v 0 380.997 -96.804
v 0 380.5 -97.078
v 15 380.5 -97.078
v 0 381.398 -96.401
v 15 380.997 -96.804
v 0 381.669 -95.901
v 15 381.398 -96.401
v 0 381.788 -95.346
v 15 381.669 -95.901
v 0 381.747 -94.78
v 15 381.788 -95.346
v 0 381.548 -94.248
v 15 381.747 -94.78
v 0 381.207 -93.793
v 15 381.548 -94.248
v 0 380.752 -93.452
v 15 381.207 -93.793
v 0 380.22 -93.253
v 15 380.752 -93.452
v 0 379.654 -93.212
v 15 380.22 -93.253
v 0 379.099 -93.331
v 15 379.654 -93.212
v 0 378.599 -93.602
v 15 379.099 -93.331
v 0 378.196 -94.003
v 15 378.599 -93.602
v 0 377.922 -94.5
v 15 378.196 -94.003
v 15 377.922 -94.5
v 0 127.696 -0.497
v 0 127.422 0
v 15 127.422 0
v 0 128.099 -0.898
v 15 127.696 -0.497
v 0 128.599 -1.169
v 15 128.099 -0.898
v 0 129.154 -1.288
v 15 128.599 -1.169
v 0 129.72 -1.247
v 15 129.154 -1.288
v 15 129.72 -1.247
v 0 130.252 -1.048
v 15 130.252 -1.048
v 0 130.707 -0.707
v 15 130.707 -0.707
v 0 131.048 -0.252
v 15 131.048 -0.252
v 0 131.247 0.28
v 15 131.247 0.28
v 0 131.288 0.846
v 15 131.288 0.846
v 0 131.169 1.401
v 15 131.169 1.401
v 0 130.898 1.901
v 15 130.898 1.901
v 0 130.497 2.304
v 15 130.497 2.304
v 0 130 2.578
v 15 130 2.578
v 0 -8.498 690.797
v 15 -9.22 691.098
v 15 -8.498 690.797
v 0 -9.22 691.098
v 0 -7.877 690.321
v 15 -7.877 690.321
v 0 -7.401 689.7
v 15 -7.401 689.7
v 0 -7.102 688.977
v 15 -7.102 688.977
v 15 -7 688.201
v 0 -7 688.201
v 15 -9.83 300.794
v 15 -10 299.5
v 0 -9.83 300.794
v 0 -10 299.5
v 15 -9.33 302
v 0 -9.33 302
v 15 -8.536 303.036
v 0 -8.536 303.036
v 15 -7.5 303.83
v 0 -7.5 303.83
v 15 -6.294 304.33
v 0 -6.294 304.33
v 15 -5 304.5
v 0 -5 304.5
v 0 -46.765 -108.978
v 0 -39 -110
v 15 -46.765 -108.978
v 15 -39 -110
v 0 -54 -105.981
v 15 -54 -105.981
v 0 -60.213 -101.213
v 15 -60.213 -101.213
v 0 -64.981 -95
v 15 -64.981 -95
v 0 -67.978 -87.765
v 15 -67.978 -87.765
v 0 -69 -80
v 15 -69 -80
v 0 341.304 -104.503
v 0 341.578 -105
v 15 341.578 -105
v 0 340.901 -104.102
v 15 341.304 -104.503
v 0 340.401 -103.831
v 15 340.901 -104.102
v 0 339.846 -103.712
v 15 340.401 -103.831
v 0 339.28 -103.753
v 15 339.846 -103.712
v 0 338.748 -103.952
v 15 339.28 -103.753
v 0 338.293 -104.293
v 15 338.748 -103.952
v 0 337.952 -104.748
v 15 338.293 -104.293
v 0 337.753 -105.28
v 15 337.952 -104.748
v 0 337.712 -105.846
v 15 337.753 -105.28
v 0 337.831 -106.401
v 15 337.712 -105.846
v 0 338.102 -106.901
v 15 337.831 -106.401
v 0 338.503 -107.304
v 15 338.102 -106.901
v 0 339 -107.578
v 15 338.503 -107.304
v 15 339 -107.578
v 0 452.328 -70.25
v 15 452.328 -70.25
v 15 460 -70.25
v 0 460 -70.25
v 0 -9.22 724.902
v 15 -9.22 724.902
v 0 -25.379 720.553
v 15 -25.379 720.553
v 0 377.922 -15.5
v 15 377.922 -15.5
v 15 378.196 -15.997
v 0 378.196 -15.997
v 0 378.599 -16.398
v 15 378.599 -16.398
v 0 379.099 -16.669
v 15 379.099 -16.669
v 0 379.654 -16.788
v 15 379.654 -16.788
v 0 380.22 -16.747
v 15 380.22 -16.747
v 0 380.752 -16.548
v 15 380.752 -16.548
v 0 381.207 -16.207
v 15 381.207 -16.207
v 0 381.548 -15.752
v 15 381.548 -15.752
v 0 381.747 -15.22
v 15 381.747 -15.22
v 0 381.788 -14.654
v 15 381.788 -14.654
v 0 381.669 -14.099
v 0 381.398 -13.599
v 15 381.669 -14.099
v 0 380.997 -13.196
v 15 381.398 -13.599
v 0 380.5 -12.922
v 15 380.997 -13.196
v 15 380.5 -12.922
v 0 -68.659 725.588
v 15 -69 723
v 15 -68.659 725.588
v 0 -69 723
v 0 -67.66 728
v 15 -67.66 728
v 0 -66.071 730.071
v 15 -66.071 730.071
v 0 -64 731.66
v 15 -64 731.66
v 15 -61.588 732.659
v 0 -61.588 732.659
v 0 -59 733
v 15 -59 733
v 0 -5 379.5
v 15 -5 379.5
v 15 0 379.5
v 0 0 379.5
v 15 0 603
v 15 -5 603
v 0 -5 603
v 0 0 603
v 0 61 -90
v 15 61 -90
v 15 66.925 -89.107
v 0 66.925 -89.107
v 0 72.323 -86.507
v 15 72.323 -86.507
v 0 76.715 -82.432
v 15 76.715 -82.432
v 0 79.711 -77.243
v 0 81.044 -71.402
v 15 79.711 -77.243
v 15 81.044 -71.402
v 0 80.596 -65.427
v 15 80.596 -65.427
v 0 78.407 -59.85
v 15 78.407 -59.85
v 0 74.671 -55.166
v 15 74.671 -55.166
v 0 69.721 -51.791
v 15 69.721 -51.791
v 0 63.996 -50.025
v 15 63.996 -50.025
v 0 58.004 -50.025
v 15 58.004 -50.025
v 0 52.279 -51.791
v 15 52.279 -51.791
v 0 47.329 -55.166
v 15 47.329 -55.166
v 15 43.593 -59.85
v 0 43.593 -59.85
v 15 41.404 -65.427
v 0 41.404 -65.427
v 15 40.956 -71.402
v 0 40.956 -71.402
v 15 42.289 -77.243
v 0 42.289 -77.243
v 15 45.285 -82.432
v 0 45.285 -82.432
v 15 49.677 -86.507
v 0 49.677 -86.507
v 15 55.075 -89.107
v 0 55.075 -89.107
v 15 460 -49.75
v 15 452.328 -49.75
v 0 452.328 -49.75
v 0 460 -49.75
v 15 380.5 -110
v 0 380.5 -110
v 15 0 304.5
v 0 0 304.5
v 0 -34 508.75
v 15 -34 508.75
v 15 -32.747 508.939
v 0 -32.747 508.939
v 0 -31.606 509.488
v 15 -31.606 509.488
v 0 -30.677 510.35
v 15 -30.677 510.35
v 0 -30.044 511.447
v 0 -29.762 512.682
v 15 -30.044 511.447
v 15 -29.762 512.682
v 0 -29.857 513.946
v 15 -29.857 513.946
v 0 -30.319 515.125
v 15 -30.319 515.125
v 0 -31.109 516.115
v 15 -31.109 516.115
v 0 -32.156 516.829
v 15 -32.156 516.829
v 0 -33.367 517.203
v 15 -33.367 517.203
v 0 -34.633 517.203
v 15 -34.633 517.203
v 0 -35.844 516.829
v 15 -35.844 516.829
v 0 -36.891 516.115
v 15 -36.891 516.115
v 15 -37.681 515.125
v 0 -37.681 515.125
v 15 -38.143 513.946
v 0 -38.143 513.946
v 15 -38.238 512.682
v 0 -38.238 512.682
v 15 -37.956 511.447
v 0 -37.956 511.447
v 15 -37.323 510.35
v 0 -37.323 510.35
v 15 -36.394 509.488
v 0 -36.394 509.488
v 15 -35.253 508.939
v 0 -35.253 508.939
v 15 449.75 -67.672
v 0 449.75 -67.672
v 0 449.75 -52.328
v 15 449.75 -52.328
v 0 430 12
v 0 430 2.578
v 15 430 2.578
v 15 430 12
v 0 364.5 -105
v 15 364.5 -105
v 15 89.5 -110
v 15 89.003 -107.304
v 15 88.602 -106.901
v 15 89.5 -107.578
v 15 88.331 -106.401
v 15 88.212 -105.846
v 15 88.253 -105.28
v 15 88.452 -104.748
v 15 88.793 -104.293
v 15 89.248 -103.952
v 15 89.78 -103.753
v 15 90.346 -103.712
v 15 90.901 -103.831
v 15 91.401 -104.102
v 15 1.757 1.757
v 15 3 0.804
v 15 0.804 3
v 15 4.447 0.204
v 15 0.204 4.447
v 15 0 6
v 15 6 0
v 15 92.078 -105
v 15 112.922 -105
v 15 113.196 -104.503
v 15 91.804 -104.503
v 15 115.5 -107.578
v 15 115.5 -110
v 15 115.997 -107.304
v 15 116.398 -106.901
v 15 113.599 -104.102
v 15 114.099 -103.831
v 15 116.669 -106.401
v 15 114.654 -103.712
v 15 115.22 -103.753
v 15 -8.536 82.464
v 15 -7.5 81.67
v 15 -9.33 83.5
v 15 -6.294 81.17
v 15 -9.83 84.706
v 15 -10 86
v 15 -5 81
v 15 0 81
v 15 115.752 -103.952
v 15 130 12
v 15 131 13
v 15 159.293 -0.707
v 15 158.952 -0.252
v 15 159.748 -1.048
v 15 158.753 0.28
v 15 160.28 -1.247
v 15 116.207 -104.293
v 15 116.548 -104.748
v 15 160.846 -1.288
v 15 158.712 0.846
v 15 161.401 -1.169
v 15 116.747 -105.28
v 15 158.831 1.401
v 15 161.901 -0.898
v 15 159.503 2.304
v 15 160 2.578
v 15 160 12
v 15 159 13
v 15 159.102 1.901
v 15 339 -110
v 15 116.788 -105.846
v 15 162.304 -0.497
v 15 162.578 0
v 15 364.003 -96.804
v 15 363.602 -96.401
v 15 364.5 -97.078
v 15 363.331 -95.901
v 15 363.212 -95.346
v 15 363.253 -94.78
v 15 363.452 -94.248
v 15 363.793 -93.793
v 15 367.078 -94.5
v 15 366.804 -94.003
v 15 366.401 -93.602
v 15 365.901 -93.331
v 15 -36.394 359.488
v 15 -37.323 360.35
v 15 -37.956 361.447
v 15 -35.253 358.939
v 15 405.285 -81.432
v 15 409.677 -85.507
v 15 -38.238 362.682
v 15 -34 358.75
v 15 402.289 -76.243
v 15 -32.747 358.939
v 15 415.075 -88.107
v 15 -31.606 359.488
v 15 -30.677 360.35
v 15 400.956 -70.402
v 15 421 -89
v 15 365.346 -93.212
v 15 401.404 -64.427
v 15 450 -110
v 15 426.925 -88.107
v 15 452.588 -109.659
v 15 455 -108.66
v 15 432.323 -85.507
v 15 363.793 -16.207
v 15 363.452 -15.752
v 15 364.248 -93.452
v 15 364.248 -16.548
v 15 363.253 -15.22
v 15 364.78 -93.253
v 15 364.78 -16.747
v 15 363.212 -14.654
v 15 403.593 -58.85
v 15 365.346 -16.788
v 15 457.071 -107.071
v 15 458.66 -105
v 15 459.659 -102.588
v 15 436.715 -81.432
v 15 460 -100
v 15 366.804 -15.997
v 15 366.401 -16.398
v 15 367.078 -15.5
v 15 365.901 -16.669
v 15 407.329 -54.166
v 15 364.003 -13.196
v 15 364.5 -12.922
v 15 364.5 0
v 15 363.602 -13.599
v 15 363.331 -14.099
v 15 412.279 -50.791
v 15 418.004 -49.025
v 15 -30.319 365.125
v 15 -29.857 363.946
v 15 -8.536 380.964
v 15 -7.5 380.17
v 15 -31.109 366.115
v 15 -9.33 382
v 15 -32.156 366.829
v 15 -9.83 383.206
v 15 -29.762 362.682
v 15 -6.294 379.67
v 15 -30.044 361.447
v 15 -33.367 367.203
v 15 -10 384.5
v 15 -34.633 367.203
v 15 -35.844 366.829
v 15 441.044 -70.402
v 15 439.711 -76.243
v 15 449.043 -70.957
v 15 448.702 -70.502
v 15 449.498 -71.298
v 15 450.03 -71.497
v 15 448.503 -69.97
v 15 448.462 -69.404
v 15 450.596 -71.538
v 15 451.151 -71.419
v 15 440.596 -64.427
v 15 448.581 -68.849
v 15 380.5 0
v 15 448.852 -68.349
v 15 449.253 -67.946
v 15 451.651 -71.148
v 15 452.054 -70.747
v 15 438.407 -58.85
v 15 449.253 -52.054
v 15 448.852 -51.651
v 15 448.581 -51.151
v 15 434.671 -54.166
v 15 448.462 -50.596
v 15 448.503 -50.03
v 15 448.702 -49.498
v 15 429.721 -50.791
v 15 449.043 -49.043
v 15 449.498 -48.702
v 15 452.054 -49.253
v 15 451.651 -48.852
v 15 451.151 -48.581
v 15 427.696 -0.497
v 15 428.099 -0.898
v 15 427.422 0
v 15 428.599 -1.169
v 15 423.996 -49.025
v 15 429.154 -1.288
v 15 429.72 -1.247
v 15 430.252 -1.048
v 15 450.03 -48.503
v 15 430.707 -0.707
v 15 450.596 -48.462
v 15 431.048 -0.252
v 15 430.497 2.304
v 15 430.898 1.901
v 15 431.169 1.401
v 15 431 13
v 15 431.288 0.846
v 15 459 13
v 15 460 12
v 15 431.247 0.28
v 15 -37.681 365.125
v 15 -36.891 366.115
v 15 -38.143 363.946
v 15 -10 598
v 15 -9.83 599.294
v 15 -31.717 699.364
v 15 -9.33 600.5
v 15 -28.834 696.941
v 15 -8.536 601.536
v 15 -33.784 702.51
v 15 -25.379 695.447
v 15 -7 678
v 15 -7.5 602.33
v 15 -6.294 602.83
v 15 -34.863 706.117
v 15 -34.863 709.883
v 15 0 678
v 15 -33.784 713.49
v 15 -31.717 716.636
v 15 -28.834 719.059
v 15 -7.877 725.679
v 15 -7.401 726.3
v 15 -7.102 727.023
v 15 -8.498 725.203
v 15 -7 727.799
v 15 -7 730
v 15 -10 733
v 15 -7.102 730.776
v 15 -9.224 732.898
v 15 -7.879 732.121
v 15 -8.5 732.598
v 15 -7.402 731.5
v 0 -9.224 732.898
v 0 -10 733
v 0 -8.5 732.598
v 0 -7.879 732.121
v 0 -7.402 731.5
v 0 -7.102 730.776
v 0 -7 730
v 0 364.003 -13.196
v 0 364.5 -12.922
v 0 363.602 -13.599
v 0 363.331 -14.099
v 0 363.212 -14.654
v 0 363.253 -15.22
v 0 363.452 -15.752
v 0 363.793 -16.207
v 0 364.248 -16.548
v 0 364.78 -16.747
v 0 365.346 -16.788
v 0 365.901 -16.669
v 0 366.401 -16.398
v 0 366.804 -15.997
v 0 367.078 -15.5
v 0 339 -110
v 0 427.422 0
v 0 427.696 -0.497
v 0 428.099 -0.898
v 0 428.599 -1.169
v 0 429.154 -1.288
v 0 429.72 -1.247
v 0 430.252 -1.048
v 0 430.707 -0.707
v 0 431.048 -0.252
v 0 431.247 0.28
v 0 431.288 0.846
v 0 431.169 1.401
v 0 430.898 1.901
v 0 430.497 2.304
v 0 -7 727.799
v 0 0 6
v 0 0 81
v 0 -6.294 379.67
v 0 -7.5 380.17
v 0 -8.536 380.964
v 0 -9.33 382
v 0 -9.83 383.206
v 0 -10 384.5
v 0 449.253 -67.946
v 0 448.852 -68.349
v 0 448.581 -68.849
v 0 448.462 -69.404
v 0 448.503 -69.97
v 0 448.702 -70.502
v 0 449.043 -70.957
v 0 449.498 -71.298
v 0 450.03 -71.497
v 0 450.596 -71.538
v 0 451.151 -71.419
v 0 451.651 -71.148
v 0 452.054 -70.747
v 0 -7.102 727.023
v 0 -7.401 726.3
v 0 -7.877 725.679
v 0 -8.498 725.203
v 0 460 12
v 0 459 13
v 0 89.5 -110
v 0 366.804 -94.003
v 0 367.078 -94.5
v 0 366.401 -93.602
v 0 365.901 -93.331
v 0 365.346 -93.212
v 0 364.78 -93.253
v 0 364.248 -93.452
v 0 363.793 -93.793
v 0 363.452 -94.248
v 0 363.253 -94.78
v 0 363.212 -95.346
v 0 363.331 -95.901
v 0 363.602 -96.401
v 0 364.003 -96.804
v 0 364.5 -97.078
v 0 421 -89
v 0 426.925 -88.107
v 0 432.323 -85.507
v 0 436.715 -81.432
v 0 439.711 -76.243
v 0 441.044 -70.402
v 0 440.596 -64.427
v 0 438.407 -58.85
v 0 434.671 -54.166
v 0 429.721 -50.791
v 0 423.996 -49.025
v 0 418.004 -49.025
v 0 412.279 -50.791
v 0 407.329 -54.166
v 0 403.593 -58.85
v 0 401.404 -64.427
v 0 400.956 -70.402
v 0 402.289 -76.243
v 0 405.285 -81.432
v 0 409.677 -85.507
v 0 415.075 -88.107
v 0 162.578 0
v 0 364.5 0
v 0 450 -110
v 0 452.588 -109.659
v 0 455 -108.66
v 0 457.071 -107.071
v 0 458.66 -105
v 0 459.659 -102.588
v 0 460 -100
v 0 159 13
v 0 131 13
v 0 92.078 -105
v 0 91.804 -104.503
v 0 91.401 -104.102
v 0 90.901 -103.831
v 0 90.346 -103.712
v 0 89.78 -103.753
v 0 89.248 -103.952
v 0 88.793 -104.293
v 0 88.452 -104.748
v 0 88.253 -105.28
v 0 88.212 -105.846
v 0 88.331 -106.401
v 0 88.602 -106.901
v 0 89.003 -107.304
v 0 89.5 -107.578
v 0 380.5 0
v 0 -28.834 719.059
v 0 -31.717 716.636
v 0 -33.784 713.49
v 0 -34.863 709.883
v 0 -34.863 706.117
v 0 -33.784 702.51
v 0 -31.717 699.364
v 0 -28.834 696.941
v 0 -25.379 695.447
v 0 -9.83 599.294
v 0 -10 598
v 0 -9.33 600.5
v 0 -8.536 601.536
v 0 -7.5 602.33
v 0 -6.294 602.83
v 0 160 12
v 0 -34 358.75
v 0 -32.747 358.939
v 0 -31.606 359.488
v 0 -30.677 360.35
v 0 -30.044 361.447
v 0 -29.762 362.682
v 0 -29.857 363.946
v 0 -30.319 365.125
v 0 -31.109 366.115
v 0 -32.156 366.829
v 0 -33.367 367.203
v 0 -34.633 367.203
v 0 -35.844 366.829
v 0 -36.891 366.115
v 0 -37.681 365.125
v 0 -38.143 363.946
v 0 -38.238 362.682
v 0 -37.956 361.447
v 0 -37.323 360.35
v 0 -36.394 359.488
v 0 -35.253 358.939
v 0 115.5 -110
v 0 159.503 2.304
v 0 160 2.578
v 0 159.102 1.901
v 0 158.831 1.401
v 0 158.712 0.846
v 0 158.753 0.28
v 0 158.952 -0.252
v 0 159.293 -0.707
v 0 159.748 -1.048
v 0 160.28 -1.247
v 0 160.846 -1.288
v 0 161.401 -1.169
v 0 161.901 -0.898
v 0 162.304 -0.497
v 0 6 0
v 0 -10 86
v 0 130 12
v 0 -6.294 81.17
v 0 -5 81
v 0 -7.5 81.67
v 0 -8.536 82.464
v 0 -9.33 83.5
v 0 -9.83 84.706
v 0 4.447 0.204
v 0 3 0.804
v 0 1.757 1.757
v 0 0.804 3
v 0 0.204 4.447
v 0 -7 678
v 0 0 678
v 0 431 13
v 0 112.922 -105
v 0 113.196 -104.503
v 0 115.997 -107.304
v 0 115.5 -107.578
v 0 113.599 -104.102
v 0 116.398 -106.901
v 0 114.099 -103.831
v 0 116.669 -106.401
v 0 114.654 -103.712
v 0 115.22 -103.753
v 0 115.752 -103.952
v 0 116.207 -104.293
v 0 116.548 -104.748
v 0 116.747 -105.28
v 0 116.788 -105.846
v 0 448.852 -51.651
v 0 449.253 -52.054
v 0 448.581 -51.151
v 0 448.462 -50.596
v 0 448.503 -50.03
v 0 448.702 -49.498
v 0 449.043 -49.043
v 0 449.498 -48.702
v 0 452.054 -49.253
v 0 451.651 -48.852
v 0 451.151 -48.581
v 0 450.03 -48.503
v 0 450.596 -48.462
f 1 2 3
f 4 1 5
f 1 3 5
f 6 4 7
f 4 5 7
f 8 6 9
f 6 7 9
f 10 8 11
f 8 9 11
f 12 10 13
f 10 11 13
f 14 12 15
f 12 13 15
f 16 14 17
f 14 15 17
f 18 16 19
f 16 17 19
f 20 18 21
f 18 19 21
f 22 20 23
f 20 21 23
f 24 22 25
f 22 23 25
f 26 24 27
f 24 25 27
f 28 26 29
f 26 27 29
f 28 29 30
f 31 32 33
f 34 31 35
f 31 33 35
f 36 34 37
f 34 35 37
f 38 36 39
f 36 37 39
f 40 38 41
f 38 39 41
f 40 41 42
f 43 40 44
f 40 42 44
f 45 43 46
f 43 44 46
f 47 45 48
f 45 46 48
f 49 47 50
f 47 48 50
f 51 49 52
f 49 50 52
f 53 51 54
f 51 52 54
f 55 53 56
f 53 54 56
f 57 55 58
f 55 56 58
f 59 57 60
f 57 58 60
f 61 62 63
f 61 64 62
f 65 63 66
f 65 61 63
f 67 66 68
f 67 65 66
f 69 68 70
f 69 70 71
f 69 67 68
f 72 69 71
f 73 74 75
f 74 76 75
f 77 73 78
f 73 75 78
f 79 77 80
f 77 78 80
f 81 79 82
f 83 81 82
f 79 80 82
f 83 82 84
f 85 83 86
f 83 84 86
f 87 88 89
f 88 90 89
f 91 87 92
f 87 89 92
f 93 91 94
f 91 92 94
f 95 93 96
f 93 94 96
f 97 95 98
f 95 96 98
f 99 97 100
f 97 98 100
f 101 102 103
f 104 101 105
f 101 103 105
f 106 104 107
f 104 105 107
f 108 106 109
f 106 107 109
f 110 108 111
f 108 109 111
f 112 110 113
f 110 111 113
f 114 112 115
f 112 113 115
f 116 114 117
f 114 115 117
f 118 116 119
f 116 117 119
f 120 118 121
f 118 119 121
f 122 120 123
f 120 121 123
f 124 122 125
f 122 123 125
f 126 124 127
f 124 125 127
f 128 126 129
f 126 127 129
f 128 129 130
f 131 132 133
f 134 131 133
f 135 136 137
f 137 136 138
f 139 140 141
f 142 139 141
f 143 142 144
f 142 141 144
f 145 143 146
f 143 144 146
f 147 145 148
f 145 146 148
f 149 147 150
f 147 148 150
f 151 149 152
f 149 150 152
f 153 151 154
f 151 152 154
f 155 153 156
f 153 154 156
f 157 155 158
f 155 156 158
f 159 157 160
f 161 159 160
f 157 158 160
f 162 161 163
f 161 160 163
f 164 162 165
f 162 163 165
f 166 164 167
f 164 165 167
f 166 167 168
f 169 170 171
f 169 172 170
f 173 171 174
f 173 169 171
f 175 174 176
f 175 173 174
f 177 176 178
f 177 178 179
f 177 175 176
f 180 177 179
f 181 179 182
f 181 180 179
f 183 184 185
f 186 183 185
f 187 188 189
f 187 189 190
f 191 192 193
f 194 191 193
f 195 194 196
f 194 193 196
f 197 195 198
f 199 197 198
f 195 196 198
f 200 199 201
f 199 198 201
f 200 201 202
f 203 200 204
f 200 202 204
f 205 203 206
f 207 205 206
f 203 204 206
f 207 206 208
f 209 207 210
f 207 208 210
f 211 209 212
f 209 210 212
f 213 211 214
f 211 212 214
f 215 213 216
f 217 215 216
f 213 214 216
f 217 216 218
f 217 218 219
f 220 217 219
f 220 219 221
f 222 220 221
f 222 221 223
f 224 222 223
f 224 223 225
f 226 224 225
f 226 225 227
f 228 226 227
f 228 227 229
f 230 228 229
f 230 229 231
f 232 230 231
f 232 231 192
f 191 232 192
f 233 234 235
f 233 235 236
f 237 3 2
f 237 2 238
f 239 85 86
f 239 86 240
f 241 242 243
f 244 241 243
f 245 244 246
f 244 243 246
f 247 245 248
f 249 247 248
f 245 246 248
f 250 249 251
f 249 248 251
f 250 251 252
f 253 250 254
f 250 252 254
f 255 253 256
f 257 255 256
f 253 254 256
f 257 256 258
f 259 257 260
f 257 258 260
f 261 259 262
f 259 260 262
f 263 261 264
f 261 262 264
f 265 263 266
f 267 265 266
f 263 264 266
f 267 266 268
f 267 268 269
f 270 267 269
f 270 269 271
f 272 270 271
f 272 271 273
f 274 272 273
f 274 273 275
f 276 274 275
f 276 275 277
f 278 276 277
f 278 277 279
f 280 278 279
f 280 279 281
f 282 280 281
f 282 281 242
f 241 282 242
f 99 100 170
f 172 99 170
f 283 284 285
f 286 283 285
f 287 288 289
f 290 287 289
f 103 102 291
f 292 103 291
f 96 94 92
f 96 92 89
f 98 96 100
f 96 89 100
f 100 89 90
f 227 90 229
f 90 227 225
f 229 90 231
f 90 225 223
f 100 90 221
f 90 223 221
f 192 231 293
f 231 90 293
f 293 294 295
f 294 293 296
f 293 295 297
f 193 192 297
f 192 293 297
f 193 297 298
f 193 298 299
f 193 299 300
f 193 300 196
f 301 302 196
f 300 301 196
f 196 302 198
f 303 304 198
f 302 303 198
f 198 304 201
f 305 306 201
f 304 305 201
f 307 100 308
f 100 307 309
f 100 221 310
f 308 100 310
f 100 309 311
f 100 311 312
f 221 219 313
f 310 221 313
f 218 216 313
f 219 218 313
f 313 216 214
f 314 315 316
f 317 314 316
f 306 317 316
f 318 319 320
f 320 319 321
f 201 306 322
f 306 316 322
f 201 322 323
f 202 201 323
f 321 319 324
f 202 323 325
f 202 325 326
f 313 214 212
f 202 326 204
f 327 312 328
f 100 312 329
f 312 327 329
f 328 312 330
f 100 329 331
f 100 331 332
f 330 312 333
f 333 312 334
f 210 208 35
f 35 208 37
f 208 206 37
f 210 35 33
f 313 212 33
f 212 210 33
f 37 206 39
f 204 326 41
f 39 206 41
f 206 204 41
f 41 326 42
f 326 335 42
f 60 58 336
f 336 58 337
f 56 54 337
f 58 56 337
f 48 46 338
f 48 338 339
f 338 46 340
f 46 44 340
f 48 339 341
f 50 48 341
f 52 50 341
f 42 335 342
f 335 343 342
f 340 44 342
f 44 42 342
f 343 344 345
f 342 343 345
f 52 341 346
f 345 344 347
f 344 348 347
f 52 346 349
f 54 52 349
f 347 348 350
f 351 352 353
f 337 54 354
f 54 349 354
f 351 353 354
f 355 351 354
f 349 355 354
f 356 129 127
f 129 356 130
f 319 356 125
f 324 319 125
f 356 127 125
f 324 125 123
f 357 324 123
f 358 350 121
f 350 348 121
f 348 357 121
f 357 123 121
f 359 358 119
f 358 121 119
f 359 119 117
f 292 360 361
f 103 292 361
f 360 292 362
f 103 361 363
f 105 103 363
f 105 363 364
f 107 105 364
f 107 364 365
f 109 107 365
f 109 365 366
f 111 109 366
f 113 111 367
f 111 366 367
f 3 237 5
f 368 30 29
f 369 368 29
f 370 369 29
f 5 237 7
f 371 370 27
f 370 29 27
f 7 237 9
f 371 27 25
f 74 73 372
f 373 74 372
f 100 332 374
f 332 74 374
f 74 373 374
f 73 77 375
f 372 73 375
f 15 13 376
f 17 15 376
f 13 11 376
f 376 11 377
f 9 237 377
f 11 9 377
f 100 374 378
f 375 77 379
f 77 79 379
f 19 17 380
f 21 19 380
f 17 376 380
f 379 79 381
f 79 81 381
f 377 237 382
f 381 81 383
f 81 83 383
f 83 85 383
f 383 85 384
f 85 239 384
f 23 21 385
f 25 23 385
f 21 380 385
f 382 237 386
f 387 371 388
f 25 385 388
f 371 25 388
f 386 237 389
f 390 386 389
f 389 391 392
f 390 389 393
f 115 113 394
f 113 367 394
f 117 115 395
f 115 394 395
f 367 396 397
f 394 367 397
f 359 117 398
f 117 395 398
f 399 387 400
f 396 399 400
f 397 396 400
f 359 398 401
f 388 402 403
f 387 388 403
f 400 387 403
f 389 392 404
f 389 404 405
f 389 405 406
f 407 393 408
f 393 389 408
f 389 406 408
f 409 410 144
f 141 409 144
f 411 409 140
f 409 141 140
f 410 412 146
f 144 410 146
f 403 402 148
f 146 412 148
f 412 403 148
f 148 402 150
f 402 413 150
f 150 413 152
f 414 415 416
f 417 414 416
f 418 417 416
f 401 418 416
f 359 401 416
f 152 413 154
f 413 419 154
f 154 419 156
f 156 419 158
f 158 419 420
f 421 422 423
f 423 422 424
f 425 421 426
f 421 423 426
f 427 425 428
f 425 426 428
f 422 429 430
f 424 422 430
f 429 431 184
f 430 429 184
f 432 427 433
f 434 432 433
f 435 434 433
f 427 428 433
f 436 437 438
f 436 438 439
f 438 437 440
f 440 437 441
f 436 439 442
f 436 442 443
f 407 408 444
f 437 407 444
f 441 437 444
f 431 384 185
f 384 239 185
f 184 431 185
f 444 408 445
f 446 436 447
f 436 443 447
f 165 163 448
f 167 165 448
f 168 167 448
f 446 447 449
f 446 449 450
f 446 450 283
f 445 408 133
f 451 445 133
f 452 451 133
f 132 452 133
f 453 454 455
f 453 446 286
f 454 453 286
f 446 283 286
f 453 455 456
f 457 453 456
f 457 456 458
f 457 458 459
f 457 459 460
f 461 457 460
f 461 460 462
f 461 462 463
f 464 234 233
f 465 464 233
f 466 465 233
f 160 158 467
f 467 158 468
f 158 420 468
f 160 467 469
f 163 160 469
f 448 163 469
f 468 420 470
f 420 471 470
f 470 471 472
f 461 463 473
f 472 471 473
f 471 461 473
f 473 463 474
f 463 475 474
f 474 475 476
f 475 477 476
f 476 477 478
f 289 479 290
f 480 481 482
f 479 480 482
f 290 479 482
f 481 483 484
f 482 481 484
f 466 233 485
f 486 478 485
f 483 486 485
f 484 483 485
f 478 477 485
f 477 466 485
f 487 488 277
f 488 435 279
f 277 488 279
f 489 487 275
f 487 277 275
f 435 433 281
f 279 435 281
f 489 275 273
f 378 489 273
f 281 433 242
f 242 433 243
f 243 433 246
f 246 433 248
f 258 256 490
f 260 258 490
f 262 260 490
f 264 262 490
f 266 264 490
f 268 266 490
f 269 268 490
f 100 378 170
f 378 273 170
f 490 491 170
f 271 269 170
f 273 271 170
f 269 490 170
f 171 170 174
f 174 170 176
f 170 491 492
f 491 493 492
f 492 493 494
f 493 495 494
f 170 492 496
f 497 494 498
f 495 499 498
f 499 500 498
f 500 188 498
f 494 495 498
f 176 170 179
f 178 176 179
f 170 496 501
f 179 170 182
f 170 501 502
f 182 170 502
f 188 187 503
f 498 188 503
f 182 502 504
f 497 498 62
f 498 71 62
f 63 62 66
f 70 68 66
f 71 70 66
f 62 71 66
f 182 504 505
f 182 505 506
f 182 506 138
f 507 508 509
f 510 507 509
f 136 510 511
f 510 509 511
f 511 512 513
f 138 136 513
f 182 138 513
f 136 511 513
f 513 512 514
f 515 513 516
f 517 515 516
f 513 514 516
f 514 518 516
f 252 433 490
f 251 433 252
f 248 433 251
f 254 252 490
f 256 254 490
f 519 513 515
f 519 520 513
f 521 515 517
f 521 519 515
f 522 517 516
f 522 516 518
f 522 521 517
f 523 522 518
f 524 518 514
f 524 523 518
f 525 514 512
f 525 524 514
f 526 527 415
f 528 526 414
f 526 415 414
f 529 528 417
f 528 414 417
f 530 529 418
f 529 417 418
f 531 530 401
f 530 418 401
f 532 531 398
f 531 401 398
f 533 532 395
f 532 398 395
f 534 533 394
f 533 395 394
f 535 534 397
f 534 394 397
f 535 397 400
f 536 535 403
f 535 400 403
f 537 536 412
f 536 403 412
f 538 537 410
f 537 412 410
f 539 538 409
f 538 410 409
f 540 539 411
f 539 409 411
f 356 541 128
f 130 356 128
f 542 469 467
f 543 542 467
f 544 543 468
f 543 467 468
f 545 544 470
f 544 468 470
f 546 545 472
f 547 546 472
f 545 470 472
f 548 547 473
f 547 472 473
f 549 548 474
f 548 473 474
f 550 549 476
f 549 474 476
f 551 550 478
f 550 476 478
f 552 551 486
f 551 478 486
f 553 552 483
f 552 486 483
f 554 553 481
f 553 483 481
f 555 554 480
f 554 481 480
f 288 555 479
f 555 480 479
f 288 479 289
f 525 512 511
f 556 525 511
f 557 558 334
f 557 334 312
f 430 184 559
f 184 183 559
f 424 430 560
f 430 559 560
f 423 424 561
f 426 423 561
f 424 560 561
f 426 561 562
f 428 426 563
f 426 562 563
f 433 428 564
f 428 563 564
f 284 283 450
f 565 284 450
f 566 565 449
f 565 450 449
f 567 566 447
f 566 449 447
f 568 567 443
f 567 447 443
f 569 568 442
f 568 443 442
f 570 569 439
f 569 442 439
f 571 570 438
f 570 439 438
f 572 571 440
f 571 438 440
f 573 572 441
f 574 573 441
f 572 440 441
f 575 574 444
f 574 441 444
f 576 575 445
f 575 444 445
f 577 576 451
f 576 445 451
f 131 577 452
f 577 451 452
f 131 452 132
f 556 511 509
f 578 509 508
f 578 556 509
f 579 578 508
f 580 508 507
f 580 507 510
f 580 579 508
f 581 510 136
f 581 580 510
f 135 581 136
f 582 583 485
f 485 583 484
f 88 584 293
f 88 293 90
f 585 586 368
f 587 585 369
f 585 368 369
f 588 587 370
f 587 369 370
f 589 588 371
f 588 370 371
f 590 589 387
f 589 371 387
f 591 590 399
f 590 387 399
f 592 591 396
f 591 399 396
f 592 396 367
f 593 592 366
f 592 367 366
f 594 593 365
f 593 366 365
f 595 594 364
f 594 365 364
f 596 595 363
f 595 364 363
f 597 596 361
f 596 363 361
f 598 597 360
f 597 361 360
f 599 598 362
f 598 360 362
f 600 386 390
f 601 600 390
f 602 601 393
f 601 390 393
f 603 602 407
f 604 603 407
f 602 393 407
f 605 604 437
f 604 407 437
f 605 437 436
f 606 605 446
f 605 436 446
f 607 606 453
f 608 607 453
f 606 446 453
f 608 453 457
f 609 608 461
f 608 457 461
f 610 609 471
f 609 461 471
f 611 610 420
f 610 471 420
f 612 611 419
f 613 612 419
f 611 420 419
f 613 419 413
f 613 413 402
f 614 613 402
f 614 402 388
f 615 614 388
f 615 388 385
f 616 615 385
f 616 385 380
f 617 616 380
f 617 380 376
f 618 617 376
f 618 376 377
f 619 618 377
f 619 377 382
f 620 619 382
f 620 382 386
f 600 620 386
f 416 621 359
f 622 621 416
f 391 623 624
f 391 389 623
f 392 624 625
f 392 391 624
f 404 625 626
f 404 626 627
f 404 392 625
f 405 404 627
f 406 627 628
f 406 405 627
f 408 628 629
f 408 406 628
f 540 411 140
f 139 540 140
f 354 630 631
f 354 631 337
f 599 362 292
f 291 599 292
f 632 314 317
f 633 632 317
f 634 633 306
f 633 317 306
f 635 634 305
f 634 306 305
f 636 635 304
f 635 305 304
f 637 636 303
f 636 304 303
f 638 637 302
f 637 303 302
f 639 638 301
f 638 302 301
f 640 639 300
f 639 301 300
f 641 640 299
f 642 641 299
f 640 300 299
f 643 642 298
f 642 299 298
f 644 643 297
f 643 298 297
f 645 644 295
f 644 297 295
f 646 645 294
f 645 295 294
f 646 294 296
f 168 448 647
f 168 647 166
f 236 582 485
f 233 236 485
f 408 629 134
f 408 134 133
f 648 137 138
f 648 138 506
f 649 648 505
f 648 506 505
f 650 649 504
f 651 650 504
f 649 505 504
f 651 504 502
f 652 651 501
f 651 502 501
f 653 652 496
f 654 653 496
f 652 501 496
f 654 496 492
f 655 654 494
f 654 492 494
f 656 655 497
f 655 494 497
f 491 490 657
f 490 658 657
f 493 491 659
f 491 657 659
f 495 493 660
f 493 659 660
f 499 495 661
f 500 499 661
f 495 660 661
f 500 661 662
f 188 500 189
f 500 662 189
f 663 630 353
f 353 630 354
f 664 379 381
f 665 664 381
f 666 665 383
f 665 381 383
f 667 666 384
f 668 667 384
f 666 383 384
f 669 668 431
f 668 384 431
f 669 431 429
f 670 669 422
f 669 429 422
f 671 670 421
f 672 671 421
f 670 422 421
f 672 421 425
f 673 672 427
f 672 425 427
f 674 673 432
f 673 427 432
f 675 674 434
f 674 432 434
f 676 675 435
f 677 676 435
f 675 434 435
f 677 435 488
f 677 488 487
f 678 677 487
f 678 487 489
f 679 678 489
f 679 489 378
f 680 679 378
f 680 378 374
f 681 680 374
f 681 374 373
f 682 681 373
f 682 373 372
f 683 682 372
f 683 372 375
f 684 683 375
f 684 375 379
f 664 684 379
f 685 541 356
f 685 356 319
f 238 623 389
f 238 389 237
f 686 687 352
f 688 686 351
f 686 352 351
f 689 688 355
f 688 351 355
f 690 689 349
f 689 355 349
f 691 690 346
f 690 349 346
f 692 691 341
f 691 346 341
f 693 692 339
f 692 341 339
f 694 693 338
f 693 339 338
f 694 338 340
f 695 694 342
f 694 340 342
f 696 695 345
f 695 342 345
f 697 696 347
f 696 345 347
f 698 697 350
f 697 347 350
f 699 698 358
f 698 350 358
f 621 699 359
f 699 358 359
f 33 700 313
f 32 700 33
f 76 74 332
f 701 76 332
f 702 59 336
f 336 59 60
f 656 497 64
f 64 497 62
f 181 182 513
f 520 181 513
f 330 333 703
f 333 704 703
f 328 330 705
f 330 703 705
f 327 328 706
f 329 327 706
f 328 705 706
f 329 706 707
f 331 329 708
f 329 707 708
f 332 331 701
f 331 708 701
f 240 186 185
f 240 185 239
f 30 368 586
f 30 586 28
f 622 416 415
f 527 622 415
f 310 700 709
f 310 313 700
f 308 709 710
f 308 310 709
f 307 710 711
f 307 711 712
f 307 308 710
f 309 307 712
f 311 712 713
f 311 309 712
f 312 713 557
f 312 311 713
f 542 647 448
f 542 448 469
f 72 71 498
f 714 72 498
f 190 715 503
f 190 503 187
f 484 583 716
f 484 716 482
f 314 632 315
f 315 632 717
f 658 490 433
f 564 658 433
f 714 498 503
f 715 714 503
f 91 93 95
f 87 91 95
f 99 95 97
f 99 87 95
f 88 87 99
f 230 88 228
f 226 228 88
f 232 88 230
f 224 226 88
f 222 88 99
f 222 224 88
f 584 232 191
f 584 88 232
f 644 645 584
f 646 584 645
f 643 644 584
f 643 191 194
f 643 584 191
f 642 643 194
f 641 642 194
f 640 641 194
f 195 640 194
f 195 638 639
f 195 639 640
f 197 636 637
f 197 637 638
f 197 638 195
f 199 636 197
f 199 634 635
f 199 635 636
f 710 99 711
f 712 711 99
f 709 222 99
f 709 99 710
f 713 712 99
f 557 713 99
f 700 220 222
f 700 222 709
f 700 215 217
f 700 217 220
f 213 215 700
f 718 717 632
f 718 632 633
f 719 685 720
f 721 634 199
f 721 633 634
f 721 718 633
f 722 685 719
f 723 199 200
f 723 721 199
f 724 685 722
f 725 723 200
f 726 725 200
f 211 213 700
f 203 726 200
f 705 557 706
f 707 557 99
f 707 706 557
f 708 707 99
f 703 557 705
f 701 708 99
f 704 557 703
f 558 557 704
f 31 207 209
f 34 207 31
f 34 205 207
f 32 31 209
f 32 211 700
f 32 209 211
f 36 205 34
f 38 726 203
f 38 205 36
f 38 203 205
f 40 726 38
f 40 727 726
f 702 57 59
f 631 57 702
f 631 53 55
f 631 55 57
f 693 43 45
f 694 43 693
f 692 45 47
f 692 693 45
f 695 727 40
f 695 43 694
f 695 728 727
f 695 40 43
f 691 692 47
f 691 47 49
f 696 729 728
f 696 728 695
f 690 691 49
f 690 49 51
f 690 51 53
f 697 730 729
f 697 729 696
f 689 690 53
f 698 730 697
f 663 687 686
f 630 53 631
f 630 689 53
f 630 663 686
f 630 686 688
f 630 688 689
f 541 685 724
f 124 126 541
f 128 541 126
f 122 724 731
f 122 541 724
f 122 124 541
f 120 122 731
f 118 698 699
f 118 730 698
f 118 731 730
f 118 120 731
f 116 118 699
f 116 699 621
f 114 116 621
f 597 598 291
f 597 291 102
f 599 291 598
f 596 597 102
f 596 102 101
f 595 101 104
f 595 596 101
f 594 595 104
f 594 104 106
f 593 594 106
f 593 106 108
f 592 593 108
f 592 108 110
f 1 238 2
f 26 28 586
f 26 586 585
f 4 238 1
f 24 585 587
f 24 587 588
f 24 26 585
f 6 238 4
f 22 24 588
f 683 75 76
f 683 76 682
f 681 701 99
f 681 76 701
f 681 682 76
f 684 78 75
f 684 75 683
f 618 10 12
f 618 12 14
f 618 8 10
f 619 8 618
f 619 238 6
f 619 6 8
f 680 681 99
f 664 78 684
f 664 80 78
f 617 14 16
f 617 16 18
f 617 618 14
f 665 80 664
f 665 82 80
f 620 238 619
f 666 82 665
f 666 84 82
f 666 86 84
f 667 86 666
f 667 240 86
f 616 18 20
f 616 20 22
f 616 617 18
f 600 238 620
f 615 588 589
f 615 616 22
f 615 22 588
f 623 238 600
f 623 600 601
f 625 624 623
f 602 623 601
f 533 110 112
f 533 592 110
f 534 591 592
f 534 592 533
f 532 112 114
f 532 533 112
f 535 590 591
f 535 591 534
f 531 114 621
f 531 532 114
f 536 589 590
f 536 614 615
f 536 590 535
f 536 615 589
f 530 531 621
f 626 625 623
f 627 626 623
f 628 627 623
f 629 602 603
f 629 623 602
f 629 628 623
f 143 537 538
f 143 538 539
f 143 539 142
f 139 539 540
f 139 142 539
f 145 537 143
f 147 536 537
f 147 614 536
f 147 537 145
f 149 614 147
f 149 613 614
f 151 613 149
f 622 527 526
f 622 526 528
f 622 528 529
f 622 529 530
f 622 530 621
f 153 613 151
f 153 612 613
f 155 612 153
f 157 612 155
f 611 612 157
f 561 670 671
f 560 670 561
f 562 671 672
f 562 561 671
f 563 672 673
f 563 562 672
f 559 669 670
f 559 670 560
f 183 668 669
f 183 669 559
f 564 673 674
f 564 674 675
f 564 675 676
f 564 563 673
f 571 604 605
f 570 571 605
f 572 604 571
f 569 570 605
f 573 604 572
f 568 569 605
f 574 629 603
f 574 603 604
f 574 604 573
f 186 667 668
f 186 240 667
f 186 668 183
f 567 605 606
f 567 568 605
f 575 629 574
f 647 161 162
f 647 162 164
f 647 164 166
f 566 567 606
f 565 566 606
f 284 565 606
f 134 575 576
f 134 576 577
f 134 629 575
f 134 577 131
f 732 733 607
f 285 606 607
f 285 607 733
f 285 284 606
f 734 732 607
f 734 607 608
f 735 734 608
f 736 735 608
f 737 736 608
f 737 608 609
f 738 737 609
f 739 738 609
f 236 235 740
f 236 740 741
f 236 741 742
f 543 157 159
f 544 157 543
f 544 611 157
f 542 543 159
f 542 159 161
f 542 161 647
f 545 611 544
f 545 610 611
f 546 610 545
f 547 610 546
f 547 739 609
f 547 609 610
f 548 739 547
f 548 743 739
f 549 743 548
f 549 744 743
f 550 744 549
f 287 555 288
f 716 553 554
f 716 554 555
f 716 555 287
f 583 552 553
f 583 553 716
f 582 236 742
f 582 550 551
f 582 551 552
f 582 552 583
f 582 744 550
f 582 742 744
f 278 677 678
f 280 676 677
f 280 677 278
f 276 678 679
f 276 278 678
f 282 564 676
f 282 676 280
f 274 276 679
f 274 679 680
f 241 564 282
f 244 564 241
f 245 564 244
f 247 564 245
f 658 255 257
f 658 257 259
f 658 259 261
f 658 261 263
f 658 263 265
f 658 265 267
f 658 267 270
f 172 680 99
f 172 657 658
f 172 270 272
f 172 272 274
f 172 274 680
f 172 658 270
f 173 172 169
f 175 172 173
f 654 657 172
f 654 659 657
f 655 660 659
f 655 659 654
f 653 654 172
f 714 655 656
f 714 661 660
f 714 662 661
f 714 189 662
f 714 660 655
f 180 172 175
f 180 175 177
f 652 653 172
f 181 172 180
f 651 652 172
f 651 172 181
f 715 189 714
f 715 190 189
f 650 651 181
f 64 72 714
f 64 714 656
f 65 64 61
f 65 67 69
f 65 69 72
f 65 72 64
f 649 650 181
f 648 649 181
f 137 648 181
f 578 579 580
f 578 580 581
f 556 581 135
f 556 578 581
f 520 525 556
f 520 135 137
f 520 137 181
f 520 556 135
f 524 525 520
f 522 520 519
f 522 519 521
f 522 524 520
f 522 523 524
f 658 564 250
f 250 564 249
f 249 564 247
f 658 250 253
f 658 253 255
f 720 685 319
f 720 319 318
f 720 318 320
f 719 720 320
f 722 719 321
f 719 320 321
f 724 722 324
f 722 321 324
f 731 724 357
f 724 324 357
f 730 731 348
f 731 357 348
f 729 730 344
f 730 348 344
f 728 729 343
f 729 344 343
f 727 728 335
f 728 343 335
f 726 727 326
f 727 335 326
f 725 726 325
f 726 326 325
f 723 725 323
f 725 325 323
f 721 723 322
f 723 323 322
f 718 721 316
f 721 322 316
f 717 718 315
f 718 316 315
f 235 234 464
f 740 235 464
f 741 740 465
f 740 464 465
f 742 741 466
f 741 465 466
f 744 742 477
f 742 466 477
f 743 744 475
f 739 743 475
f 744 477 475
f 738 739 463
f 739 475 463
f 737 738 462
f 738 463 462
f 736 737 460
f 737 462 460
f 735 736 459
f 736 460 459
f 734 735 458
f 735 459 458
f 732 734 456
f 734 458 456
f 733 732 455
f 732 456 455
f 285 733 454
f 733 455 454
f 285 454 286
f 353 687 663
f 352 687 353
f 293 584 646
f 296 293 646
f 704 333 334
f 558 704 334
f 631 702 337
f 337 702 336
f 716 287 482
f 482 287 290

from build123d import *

# Parameters (mm, degrees)
BOSS_EXTRUDE1_DEPTH = 15
FILLET1_R           = 30
SKETCH2_R           = 20.1
CUT_EXTRUDE1_DEPTH  = 820.456527218
FILLET2_R           = 6
SKETCH4_W           = 15
SKETCH4_H           = 30
BOSS_EXTRUDE2_DEPTH = 13
FILLET3_R           = 10
SKETCH5_W           = 20.5
SKETCH5_H           = 10.25
CUT_EXTRUDE3_DEPTH  = 820.456527218
SKETCH6_W           = 15.5
SKETCH6_H           = 16
CUT_EXTRUDE4_DEPTH  = 820.456527218
SKETCH7_W           = 5
SKETCH7_H           = 25.5
SKETCH7_H_2         = 26
CUT_EXTRUDE5_DEPTH  = 820.456527218
CHAMFER1_SIZE       = 1
SKETCH8_W           = 223.5
SKETCH8_H           = 10
CUT_EXTRUDE6_DEPTH  = 15
FILLET4_R           = 5
SKETCH9_R           = 2
CUT_EXTRUDE7_DEPTH  = 820.456527218
SKETCH10_R          = 2
CUT_EXTRUDE8_DEPTH  = 820.456527218
SKETCH11_R          = 2
CUT_EXTRUDE9_DEPTH  = 820.456527218
SKETCH12_R          = 2
CUT_EXTRUDE10_DEPTH = 820.456527218
BOSS_EXTRUDE3_DEPTH = 15
FILLET5_R           = 10
FILLET6_R           = 3
SKETCH14_R          = 4.25
CUT_EXTRUDE11_DEPTH = 866.513720284


with BuildPart() as part:
    # Sketch1 → Boss-Extrude1 (new body)
    with BuildSketch(Plane(origin=(0, 0, 0), x_dir=(0, 0, -1), z_dir=(1, 0, 0))):
        Polygon((-678, 0), (0, 0), (0, 460), (110, 460), (110, -69), (-678, -69), align=None)
    extrude(amount=BOSS_EXTRUDE1_DEPTH)

    # Fillet1
    fillet1_edges = [part.edges().sort_by_distance(p)[0] for p in [
        (7.5, -69, -110),
    ]]
    fillet(fillet1_edges, radius=FILLET1_R)

    # Sketch2 → Cut-Extrude1 (cut, through all)
    with BuildSketch(Plane(origin=(15, 0, 0), x_dir=(0, 0, -1), z_dir=(1, 0, 0))):
        with Locations((68.9, 421)):
            Circle(SKETCH2_R)
        with Locations((69.9, 61)):
            Circle(SKETCH2_R)
    extrude(amount=-CUT_EXTRUDE1_DEPTH, mode=Mode.SUBTRACT)

    # Fillet2
    fillet2_edges = [part.edges().sort_by_distance(p)[0] for p in [
        (7.5, 0, 0),
    ]]
    fillet(fillet2_edges, radius=FILLET2_R)

    # Sketch4 → Boss-Extrude2 (add)
    with BuildSketch(Plane.XY):
        with Locations((7.5, 445)):
            Rectangle(SKETCH4_W, SKETCH4_H)
        with Locations((7.5, 145)):
            Rectangle(SKETCH4_W, SKETCH4_H)
    extrude(amount=BOSS_EXTRUDE2_DEPTH)

    # Fillet3
    fillet3_edges = [part.edges().sort_by_distance(p)[0] for p in [
        (7.5, 460, -110),
    ]]
    fillet(fillet3_edges, radius=FILLET3_R)

    # Sketch5 → Cut-Extrude3 (cut, through all)
    with BuildSketch(Plane.ZY):
        with Locations((-60, 454.875)):
            Rectangle(SKETCH5_W, SKETCH5_H)
    extrude(amount=-CUT_EXTRUDE3_DEPTH, mode=Mode.SUBTRACT)

    # Sketch6 → Cut-Extrude4 (cut, through all)
    with BuildSketch(Plane(origin=(15, 0, 0), x_dir=(0, 0, -1), z_dir=(1, 0, 0))):
        with Locations((102.25, 372.5)):
            Rectangle(SKETCH6_W, SKETCH6_H)
        with Locations((7.75, 372.5)):
            Rectangle(SKETCH6_W, SKETCH6_H)
    extrude(amount=-CUT_EXTRUDE4_DEPTH, mode=Mode.SUBTRACT)

    # Sketch7 → Cut-Extrude5 (cut, through all)
    with BuildSketch(Plane.ZY):
        with Locations((-107.5, 351.75)):
            Rectangle(SKETCH7_W, SKETCH7_H)
        with Locations((-107.5, 102.5)):
            Rectangle(SKETCH7_W, SKETCH7_H_2)
    extrude(amount=-CUT_EXTRUDE5_DEPTH, mode=Mode.SUBTRACT)

    # Chamfer1
    chamfer1_edges = [part.edges().sort_by_distance(p)[0] for p in [
        (7.5, 430, 13),
        (7.5, 460, 13),
        (7.5, 130, 13),
        (7.5, 160, 13),
    ]]
    chamfer(chamfer1_edges, length=CHAMFER1_SIZE)

    # Sketch8 → Cut-Extrude6 (cut)
    with BuildSketch(Plane(origin=(15, 0, 0), x_dir=(0, 0, -1), z_dir=(1, 0, 0))):
        with Locations((-491.25, -5)):
            Rectangle(SKETCH8_W, SKETCH8_H)
        with Locations((-192.75, -5)):
            Rectangle(SKETCH8_W, SKETCH8_H)
    extrude(amount=-CUT_EXTRUDE6_DEPTH, mode=Mode.SUBTRACT)

    # Fillet4
    fillet4_edges = [part.edges().sort_by_distance(p)[0] for p in [
        (7.5, -10, 603),
        (7.5, -10, 379.5),
        (7.5, -10, 81),
        (7.5, -10, 304.5),
    ]]
    fillet(fillet4_edges, radius=FILLET4_R)

    # Sketch9 → Cut-Extrude7 (cut, through all)
    with BuildSketch(Plane(origin=(15, 0, 0), x_dir=(0, 0, -1), z_dir=(1, 0, 0))):
        with Locations((-0.707106781, 129.292893219)):
            Circle(SKETCH9_R)
        with Locations((-0.707106781, 160.707106781)):
            Circle(SKETCH9_R)
        with Locations((-0.707106781, 429.292893219)):
            Circle(SKETCH9_R)
    extrude(amount=-CUT_EXTRUDE7_DEPTH, mode=Mode.SUBTRACT)

    # Sketch10 → Cut-Extrude8 (cut, through all)
    with BuildSketch(Plane(origin=(15, 0, 0), x_dir=(0, 0, -1), z_dir=(1, 0, 0))):
        with Locations((50.457106781, 450.457106781)):
            Circle(SKETCH10_R)
        with Locations((69.542893219, 450.457106781)):
            Circle(SKETCH10_R)
    extrude(amount=-CUT_EXTRUDE8_DEPTH, mode=Mode.SUBTRACT)

    # Sketch11 → Cut-Extrude9 (cut, through all)
    with BuildSketch(Plane(origin=(15, 0, 0), x_dir=(0, 0, -1), z_dir=(1, 0, 0))):
        with Locations((14.792893219, 365.207106781)):
            Circle(SKETCH11_R)
        with Locations((14.792893219, 379.792893219)):
            Circle(SKETCH11_R)
        with Locations((95.207106781, 379.792893219)):
            Circle(SKETCH11_R)
        with Locations((95.207106781, 365.207106781)):
            Circle(SKETCH11_R)
    extrude(amount=-CUT_EXTRUDE9_DEPTH, mode=Mode.SUBTRACT)

    # Sketch12 → Cut-Extrude10 (cut, through all)
    with BuildSketch(Plane(origin=(15, 0, 0), x_dir=(0, 0, -1), z_dir=(1, 0, 0))):
        with Locations((105.707106781, 90.207106781)):
            Circle(SKETCH12_R)
        with Locations((105.707106781, 114.792893219)):
            Circle(SKETCH12_R)
        with Locations((105.707106781, 339.707106781)):
            Circle(SKETCH12_R)
    extrude(amount=-CUT_EXTRUDE10_DEPTH, mode=Mode.SUBTRACT)

    # Sketch13 → Boss-Extrude3 (add)
    with BuildSketch(Plane(origin=(15, 0, 0), x_dir=(0, 0, -1), z_dir=(1, 0, 0))):
        with BuildLine():
            Line((-678, -69), (-733, -69))
            Line((-733, -69), (-733, -7))
            Line((-733, -7), (-725.5, -7))
            Line((-725.5, -7), (-720.55324034, -25.378780397))
            ThreePointArc((-720.55324034, -25.378780397), (-708, -35), (-695.44675966, -25.378780397))
            Line((-695.44675966, -25.378780397), (-690.5, -7))
            Line((-690.5, -7), (-678, -7))
            Line((-678, -7), (-678, -69))
        make_face()
    extrude(amount=-BOSS_EXTRUDE3_DEPTH)

    # Fillet5
    fillet5_edges = [part.edges().sort_by_distance(p)[0] for p in [
        (7.5, -69, 733),
    ]]
    fillet(fillet5_edges, radius=FILLET5_R)

    # Fillet6
    fillet6_edges = [part.edges().sort_by_distance(p)[0] for p in [
        (7.5, -7, 733),
        (7.5, -7, 725.5),
        (7.5, -7, 690.5),
    ]]
    fillet(fillet6_edges, radius=FILLET6_R)

    # Sketch14 → Cut-Extrude11 (cut, through all)
    with BuildSketch(Plane(origin=(15, 0, 0), x_dir=(0, 0, -1), z_dir=(1, 0, 0))):
        with Locations((-513, -34)):
            Circle(SKETCH14_R)
        with Locations((-363, -34)):
            Circle(SKETCH14_R)
    extrude(amount=-CUT_EXTRUDE11_DEPTH, mode=Mode.SUBTRACT)


solid = part.part
